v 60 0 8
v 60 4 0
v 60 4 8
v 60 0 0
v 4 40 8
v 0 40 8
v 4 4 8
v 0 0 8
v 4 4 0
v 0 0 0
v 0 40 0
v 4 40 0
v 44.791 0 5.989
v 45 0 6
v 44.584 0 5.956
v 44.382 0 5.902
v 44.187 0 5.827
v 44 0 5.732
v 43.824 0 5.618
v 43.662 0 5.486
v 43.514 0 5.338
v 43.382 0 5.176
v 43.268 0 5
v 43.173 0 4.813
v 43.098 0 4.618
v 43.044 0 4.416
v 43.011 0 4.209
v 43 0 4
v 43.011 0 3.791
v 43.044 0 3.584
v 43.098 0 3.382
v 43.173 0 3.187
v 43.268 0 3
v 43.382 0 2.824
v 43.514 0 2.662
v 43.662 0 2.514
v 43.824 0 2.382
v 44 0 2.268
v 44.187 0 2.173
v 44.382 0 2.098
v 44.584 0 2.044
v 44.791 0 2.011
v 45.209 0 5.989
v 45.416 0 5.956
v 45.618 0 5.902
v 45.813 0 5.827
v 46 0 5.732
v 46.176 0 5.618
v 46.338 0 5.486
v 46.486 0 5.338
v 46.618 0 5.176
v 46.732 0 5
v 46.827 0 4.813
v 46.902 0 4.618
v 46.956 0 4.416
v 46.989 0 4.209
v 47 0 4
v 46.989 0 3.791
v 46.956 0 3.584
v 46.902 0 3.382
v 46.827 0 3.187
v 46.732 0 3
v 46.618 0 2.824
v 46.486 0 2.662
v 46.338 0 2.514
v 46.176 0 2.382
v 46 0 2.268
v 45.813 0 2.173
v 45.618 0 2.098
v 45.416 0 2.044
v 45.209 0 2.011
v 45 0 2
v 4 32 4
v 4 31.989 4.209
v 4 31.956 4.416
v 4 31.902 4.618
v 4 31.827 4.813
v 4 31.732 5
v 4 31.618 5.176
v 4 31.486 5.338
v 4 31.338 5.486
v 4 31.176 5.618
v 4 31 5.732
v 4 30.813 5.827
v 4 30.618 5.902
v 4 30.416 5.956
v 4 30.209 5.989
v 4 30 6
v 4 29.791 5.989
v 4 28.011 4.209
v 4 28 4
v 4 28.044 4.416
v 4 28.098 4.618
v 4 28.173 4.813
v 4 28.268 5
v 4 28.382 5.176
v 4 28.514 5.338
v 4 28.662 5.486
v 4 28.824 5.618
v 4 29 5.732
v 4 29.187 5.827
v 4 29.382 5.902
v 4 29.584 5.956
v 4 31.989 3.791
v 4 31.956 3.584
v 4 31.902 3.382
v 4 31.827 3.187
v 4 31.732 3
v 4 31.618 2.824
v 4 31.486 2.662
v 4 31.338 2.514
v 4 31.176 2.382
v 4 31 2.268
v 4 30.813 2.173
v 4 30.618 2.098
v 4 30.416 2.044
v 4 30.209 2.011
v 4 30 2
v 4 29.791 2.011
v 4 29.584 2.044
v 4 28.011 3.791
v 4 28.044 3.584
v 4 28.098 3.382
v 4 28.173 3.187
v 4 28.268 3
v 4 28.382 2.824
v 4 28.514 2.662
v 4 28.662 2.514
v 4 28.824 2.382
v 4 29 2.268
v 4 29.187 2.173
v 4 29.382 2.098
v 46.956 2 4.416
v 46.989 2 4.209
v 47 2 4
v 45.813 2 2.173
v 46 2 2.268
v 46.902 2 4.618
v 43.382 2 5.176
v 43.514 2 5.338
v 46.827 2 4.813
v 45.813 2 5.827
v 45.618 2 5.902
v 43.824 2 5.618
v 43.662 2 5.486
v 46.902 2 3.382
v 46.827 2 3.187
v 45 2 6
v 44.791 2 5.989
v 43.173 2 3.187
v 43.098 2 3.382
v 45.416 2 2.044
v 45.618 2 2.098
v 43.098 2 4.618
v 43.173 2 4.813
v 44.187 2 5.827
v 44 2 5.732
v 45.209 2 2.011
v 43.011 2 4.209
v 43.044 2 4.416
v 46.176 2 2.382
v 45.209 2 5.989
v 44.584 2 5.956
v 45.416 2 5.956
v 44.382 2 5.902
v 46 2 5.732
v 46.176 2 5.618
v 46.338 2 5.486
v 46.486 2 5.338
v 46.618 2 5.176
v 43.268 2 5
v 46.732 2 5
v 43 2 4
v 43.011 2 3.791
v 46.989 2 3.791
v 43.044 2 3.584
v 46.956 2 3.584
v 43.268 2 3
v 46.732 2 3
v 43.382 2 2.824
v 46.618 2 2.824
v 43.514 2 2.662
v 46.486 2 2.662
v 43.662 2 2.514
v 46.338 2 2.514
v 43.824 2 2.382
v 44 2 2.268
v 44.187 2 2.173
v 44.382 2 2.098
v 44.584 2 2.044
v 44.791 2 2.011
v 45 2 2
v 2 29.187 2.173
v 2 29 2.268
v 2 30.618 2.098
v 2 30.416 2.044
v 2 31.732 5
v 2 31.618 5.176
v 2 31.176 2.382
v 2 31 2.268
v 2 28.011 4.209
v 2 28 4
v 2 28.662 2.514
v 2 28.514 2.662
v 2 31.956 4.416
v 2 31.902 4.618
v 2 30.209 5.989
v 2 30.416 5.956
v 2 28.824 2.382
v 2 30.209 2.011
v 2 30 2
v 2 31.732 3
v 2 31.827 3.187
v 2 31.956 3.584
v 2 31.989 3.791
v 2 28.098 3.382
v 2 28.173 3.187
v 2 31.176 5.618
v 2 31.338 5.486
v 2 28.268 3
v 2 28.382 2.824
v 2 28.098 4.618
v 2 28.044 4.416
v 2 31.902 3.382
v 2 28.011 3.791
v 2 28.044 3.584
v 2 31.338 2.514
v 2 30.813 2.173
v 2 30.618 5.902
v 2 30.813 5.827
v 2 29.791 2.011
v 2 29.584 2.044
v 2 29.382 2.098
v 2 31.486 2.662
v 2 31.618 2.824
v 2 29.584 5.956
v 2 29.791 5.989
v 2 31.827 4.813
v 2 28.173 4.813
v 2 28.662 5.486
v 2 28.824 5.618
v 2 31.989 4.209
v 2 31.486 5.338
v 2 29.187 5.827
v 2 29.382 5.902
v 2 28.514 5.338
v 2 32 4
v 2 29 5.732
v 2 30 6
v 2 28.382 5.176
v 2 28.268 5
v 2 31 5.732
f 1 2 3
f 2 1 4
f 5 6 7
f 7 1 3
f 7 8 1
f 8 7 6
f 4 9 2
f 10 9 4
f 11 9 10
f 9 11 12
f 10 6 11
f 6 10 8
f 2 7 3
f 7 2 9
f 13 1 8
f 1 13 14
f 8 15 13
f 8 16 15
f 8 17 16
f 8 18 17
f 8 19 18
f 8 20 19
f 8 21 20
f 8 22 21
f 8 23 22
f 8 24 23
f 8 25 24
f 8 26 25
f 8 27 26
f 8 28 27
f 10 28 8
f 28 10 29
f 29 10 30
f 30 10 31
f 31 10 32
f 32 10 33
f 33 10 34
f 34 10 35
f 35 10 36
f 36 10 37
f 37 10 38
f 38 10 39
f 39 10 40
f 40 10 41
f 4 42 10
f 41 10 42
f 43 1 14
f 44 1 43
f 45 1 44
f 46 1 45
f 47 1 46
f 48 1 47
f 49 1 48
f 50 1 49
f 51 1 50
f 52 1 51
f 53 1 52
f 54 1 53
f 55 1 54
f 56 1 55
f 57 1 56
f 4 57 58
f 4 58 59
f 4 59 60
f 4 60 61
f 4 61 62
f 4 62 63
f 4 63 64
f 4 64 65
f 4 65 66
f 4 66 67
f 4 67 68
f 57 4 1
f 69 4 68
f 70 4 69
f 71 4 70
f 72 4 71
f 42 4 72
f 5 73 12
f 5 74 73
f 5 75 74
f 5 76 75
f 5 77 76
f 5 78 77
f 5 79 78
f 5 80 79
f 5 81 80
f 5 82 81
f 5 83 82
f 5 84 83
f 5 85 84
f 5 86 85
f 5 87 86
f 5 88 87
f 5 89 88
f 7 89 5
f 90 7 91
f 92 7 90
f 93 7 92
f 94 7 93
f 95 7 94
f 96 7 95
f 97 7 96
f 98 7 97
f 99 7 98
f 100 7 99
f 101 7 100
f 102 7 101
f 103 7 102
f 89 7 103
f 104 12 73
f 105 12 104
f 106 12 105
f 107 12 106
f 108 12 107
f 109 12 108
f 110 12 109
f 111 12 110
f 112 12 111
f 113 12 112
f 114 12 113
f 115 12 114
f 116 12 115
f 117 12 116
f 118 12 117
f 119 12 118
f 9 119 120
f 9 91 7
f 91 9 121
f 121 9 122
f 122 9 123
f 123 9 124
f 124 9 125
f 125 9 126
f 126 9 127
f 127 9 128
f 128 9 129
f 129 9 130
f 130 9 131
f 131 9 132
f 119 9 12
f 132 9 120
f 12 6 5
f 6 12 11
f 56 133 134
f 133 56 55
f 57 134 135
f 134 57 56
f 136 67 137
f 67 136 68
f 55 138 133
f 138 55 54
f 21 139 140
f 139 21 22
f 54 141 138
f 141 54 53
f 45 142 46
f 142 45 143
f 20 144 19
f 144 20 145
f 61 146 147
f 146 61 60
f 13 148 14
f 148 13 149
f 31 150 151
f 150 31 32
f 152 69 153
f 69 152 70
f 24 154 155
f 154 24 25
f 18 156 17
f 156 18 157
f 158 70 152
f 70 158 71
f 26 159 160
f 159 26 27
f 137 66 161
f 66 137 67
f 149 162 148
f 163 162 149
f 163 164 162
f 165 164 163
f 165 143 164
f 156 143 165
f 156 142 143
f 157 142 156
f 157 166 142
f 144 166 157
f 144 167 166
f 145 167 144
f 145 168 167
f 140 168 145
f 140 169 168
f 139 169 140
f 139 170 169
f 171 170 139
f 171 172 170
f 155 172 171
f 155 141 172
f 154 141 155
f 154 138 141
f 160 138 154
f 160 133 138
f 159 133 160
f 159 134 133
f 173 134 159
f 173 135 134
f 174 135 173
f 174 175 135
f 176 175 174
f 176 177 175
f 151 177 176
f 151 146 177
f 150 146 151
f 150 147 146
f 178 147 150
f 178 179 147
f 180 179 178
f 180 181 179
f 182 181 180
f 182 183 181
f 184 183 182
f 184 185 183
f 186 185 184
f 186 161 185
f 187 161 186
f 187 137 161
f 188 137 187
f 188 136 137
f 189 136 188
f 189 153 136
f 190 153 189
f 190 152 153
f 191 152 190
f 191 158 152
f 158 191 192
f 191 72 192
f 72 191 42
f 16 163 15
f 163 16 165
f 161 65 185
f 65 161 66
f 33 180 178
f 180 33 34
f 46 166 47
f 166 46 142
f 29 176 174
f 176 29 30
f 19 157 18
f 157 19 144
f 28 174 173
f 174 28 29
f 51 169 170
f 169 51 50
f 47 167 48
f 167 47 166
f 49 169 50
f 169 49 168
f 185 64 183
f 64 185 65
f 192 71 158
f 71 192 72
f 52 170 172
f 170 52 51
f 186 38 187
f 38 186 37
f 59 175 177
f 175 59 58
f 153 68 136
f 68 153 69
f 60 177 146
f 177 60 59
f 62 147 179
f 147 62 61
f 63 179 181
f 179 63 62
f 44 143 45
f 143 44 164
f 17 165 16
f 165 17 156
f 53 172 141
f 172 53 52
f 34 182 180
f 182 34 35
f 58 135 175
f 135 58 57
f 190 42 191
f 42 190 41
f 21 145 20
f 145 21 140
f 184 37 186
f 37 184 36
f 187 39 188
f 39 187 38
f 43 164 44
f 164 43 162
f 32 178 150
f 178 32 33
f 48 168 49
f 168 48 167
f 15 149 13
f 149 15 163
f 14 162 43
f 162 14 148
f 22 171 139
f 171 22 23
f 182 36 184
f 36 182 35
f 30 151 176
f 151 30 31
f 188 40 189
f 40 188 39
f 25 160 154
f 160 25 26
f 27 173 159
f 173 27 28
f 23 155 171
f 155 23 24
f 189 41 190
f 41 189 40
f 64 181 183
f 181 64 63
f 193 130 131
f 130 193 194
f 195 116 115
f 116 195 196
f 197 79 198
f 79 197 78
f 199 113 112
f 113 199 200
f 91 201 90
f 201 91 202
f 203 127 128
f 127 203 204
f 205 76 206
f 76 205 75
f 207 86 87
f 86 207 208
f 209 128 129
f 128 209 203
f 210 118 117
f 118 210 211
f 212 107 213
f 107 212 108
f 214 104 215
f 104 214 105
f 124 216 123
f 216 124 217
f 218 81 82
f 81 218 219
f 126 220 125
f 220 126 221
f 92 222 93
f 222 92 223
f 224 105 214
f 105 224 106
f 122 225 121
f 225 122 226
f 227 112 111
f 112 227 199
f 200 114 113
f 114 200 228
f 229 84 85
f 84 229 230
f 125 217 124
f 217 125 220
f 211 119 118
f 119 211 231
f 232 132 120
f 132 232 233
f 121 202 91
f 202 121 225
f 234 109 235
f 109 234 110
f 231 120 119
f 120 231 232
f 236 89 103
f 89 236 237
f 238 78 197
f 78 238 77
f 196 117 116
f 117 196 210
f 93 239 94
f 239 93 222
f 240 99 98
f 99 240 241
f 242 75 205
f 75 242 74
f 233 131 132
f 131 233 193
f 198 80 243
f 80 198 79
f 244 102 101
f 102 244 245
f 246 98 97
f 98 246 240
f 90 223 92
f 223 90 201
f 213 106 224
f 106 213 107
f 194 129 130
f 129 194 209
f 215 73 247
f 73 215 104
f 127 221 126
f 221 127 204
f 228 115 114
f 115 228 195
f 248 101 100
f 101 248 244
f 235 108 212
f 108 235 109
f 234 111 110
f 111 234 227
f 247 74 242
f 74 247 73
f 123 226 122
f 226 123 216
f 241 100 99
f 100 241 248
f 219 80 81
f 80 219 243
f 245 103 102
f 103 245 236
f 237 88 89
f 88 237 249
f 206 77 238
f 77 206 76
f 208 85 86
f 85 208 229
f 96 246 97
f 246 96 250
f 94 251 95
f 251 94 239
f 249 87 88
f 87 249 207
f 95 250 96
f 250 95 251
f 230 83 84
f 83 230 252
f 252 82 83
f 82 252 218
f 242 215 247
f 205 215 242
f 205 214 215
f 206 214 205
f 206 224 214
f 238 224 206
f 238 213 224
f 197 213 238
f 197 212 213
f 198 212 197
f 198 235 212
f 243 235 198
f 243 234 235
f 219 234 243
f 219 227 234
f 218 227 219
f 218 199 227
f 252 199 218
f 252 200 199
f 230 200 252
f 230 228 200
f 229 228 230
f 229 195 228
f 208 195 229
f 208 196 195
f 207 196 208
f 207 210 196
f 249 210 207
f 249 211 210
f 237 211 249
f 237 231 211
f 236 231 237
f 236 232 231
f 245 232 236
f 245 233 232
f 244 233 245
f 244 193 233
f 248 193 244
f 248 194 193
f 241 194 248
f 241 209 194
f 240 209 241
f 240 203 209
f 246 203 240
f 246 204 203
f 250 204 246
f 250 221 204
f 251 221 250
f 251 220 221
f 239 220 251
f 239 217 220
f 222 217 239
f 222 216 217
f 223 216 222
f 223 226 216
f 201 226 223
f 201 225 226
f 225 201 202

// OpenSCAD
// Generated by HEIDI for job job_1787696804524_f24e43bb
// Product: 3D-Printable Model Preparation Package
// Request: A simple L-shaped bracket for mounting a shelf on the wall
// Model type: bracket
// Generated: 2026-08-25T22:26:44.794Z
//
// This is a parameterized OpenSCAD model. You can adjust the
// parameters below to customize the dimensions before rendering.

// ─── Parameters ───
width = 60;       // X dimension in mm
height = 40;     // Y dimension in mm
depth = 8;       // Z dimension in mm
wall = 4;    // wall thickness in mm
$fn = 60;               // facet resolution

// L-shaped bracket
module bracket() {
    difference() {
        union() {
            // Horizontal arm
            cube([width, wall, depth]);
            // Vertical arm
            cube([wall, height, depth]);
        }
        // Mounting holes
        translate([width * 0.75, wall / 2, depth / 2])
            rotate([90, 0, 0])
                cylinder(h = wall + 2, d = 4);
        translate([wall / 2, height * 0.75, depth / 2])
            rotate([0, 90, 0])
                cylinder(h = wall + 2, d = 4);
    }
}
bracket();
